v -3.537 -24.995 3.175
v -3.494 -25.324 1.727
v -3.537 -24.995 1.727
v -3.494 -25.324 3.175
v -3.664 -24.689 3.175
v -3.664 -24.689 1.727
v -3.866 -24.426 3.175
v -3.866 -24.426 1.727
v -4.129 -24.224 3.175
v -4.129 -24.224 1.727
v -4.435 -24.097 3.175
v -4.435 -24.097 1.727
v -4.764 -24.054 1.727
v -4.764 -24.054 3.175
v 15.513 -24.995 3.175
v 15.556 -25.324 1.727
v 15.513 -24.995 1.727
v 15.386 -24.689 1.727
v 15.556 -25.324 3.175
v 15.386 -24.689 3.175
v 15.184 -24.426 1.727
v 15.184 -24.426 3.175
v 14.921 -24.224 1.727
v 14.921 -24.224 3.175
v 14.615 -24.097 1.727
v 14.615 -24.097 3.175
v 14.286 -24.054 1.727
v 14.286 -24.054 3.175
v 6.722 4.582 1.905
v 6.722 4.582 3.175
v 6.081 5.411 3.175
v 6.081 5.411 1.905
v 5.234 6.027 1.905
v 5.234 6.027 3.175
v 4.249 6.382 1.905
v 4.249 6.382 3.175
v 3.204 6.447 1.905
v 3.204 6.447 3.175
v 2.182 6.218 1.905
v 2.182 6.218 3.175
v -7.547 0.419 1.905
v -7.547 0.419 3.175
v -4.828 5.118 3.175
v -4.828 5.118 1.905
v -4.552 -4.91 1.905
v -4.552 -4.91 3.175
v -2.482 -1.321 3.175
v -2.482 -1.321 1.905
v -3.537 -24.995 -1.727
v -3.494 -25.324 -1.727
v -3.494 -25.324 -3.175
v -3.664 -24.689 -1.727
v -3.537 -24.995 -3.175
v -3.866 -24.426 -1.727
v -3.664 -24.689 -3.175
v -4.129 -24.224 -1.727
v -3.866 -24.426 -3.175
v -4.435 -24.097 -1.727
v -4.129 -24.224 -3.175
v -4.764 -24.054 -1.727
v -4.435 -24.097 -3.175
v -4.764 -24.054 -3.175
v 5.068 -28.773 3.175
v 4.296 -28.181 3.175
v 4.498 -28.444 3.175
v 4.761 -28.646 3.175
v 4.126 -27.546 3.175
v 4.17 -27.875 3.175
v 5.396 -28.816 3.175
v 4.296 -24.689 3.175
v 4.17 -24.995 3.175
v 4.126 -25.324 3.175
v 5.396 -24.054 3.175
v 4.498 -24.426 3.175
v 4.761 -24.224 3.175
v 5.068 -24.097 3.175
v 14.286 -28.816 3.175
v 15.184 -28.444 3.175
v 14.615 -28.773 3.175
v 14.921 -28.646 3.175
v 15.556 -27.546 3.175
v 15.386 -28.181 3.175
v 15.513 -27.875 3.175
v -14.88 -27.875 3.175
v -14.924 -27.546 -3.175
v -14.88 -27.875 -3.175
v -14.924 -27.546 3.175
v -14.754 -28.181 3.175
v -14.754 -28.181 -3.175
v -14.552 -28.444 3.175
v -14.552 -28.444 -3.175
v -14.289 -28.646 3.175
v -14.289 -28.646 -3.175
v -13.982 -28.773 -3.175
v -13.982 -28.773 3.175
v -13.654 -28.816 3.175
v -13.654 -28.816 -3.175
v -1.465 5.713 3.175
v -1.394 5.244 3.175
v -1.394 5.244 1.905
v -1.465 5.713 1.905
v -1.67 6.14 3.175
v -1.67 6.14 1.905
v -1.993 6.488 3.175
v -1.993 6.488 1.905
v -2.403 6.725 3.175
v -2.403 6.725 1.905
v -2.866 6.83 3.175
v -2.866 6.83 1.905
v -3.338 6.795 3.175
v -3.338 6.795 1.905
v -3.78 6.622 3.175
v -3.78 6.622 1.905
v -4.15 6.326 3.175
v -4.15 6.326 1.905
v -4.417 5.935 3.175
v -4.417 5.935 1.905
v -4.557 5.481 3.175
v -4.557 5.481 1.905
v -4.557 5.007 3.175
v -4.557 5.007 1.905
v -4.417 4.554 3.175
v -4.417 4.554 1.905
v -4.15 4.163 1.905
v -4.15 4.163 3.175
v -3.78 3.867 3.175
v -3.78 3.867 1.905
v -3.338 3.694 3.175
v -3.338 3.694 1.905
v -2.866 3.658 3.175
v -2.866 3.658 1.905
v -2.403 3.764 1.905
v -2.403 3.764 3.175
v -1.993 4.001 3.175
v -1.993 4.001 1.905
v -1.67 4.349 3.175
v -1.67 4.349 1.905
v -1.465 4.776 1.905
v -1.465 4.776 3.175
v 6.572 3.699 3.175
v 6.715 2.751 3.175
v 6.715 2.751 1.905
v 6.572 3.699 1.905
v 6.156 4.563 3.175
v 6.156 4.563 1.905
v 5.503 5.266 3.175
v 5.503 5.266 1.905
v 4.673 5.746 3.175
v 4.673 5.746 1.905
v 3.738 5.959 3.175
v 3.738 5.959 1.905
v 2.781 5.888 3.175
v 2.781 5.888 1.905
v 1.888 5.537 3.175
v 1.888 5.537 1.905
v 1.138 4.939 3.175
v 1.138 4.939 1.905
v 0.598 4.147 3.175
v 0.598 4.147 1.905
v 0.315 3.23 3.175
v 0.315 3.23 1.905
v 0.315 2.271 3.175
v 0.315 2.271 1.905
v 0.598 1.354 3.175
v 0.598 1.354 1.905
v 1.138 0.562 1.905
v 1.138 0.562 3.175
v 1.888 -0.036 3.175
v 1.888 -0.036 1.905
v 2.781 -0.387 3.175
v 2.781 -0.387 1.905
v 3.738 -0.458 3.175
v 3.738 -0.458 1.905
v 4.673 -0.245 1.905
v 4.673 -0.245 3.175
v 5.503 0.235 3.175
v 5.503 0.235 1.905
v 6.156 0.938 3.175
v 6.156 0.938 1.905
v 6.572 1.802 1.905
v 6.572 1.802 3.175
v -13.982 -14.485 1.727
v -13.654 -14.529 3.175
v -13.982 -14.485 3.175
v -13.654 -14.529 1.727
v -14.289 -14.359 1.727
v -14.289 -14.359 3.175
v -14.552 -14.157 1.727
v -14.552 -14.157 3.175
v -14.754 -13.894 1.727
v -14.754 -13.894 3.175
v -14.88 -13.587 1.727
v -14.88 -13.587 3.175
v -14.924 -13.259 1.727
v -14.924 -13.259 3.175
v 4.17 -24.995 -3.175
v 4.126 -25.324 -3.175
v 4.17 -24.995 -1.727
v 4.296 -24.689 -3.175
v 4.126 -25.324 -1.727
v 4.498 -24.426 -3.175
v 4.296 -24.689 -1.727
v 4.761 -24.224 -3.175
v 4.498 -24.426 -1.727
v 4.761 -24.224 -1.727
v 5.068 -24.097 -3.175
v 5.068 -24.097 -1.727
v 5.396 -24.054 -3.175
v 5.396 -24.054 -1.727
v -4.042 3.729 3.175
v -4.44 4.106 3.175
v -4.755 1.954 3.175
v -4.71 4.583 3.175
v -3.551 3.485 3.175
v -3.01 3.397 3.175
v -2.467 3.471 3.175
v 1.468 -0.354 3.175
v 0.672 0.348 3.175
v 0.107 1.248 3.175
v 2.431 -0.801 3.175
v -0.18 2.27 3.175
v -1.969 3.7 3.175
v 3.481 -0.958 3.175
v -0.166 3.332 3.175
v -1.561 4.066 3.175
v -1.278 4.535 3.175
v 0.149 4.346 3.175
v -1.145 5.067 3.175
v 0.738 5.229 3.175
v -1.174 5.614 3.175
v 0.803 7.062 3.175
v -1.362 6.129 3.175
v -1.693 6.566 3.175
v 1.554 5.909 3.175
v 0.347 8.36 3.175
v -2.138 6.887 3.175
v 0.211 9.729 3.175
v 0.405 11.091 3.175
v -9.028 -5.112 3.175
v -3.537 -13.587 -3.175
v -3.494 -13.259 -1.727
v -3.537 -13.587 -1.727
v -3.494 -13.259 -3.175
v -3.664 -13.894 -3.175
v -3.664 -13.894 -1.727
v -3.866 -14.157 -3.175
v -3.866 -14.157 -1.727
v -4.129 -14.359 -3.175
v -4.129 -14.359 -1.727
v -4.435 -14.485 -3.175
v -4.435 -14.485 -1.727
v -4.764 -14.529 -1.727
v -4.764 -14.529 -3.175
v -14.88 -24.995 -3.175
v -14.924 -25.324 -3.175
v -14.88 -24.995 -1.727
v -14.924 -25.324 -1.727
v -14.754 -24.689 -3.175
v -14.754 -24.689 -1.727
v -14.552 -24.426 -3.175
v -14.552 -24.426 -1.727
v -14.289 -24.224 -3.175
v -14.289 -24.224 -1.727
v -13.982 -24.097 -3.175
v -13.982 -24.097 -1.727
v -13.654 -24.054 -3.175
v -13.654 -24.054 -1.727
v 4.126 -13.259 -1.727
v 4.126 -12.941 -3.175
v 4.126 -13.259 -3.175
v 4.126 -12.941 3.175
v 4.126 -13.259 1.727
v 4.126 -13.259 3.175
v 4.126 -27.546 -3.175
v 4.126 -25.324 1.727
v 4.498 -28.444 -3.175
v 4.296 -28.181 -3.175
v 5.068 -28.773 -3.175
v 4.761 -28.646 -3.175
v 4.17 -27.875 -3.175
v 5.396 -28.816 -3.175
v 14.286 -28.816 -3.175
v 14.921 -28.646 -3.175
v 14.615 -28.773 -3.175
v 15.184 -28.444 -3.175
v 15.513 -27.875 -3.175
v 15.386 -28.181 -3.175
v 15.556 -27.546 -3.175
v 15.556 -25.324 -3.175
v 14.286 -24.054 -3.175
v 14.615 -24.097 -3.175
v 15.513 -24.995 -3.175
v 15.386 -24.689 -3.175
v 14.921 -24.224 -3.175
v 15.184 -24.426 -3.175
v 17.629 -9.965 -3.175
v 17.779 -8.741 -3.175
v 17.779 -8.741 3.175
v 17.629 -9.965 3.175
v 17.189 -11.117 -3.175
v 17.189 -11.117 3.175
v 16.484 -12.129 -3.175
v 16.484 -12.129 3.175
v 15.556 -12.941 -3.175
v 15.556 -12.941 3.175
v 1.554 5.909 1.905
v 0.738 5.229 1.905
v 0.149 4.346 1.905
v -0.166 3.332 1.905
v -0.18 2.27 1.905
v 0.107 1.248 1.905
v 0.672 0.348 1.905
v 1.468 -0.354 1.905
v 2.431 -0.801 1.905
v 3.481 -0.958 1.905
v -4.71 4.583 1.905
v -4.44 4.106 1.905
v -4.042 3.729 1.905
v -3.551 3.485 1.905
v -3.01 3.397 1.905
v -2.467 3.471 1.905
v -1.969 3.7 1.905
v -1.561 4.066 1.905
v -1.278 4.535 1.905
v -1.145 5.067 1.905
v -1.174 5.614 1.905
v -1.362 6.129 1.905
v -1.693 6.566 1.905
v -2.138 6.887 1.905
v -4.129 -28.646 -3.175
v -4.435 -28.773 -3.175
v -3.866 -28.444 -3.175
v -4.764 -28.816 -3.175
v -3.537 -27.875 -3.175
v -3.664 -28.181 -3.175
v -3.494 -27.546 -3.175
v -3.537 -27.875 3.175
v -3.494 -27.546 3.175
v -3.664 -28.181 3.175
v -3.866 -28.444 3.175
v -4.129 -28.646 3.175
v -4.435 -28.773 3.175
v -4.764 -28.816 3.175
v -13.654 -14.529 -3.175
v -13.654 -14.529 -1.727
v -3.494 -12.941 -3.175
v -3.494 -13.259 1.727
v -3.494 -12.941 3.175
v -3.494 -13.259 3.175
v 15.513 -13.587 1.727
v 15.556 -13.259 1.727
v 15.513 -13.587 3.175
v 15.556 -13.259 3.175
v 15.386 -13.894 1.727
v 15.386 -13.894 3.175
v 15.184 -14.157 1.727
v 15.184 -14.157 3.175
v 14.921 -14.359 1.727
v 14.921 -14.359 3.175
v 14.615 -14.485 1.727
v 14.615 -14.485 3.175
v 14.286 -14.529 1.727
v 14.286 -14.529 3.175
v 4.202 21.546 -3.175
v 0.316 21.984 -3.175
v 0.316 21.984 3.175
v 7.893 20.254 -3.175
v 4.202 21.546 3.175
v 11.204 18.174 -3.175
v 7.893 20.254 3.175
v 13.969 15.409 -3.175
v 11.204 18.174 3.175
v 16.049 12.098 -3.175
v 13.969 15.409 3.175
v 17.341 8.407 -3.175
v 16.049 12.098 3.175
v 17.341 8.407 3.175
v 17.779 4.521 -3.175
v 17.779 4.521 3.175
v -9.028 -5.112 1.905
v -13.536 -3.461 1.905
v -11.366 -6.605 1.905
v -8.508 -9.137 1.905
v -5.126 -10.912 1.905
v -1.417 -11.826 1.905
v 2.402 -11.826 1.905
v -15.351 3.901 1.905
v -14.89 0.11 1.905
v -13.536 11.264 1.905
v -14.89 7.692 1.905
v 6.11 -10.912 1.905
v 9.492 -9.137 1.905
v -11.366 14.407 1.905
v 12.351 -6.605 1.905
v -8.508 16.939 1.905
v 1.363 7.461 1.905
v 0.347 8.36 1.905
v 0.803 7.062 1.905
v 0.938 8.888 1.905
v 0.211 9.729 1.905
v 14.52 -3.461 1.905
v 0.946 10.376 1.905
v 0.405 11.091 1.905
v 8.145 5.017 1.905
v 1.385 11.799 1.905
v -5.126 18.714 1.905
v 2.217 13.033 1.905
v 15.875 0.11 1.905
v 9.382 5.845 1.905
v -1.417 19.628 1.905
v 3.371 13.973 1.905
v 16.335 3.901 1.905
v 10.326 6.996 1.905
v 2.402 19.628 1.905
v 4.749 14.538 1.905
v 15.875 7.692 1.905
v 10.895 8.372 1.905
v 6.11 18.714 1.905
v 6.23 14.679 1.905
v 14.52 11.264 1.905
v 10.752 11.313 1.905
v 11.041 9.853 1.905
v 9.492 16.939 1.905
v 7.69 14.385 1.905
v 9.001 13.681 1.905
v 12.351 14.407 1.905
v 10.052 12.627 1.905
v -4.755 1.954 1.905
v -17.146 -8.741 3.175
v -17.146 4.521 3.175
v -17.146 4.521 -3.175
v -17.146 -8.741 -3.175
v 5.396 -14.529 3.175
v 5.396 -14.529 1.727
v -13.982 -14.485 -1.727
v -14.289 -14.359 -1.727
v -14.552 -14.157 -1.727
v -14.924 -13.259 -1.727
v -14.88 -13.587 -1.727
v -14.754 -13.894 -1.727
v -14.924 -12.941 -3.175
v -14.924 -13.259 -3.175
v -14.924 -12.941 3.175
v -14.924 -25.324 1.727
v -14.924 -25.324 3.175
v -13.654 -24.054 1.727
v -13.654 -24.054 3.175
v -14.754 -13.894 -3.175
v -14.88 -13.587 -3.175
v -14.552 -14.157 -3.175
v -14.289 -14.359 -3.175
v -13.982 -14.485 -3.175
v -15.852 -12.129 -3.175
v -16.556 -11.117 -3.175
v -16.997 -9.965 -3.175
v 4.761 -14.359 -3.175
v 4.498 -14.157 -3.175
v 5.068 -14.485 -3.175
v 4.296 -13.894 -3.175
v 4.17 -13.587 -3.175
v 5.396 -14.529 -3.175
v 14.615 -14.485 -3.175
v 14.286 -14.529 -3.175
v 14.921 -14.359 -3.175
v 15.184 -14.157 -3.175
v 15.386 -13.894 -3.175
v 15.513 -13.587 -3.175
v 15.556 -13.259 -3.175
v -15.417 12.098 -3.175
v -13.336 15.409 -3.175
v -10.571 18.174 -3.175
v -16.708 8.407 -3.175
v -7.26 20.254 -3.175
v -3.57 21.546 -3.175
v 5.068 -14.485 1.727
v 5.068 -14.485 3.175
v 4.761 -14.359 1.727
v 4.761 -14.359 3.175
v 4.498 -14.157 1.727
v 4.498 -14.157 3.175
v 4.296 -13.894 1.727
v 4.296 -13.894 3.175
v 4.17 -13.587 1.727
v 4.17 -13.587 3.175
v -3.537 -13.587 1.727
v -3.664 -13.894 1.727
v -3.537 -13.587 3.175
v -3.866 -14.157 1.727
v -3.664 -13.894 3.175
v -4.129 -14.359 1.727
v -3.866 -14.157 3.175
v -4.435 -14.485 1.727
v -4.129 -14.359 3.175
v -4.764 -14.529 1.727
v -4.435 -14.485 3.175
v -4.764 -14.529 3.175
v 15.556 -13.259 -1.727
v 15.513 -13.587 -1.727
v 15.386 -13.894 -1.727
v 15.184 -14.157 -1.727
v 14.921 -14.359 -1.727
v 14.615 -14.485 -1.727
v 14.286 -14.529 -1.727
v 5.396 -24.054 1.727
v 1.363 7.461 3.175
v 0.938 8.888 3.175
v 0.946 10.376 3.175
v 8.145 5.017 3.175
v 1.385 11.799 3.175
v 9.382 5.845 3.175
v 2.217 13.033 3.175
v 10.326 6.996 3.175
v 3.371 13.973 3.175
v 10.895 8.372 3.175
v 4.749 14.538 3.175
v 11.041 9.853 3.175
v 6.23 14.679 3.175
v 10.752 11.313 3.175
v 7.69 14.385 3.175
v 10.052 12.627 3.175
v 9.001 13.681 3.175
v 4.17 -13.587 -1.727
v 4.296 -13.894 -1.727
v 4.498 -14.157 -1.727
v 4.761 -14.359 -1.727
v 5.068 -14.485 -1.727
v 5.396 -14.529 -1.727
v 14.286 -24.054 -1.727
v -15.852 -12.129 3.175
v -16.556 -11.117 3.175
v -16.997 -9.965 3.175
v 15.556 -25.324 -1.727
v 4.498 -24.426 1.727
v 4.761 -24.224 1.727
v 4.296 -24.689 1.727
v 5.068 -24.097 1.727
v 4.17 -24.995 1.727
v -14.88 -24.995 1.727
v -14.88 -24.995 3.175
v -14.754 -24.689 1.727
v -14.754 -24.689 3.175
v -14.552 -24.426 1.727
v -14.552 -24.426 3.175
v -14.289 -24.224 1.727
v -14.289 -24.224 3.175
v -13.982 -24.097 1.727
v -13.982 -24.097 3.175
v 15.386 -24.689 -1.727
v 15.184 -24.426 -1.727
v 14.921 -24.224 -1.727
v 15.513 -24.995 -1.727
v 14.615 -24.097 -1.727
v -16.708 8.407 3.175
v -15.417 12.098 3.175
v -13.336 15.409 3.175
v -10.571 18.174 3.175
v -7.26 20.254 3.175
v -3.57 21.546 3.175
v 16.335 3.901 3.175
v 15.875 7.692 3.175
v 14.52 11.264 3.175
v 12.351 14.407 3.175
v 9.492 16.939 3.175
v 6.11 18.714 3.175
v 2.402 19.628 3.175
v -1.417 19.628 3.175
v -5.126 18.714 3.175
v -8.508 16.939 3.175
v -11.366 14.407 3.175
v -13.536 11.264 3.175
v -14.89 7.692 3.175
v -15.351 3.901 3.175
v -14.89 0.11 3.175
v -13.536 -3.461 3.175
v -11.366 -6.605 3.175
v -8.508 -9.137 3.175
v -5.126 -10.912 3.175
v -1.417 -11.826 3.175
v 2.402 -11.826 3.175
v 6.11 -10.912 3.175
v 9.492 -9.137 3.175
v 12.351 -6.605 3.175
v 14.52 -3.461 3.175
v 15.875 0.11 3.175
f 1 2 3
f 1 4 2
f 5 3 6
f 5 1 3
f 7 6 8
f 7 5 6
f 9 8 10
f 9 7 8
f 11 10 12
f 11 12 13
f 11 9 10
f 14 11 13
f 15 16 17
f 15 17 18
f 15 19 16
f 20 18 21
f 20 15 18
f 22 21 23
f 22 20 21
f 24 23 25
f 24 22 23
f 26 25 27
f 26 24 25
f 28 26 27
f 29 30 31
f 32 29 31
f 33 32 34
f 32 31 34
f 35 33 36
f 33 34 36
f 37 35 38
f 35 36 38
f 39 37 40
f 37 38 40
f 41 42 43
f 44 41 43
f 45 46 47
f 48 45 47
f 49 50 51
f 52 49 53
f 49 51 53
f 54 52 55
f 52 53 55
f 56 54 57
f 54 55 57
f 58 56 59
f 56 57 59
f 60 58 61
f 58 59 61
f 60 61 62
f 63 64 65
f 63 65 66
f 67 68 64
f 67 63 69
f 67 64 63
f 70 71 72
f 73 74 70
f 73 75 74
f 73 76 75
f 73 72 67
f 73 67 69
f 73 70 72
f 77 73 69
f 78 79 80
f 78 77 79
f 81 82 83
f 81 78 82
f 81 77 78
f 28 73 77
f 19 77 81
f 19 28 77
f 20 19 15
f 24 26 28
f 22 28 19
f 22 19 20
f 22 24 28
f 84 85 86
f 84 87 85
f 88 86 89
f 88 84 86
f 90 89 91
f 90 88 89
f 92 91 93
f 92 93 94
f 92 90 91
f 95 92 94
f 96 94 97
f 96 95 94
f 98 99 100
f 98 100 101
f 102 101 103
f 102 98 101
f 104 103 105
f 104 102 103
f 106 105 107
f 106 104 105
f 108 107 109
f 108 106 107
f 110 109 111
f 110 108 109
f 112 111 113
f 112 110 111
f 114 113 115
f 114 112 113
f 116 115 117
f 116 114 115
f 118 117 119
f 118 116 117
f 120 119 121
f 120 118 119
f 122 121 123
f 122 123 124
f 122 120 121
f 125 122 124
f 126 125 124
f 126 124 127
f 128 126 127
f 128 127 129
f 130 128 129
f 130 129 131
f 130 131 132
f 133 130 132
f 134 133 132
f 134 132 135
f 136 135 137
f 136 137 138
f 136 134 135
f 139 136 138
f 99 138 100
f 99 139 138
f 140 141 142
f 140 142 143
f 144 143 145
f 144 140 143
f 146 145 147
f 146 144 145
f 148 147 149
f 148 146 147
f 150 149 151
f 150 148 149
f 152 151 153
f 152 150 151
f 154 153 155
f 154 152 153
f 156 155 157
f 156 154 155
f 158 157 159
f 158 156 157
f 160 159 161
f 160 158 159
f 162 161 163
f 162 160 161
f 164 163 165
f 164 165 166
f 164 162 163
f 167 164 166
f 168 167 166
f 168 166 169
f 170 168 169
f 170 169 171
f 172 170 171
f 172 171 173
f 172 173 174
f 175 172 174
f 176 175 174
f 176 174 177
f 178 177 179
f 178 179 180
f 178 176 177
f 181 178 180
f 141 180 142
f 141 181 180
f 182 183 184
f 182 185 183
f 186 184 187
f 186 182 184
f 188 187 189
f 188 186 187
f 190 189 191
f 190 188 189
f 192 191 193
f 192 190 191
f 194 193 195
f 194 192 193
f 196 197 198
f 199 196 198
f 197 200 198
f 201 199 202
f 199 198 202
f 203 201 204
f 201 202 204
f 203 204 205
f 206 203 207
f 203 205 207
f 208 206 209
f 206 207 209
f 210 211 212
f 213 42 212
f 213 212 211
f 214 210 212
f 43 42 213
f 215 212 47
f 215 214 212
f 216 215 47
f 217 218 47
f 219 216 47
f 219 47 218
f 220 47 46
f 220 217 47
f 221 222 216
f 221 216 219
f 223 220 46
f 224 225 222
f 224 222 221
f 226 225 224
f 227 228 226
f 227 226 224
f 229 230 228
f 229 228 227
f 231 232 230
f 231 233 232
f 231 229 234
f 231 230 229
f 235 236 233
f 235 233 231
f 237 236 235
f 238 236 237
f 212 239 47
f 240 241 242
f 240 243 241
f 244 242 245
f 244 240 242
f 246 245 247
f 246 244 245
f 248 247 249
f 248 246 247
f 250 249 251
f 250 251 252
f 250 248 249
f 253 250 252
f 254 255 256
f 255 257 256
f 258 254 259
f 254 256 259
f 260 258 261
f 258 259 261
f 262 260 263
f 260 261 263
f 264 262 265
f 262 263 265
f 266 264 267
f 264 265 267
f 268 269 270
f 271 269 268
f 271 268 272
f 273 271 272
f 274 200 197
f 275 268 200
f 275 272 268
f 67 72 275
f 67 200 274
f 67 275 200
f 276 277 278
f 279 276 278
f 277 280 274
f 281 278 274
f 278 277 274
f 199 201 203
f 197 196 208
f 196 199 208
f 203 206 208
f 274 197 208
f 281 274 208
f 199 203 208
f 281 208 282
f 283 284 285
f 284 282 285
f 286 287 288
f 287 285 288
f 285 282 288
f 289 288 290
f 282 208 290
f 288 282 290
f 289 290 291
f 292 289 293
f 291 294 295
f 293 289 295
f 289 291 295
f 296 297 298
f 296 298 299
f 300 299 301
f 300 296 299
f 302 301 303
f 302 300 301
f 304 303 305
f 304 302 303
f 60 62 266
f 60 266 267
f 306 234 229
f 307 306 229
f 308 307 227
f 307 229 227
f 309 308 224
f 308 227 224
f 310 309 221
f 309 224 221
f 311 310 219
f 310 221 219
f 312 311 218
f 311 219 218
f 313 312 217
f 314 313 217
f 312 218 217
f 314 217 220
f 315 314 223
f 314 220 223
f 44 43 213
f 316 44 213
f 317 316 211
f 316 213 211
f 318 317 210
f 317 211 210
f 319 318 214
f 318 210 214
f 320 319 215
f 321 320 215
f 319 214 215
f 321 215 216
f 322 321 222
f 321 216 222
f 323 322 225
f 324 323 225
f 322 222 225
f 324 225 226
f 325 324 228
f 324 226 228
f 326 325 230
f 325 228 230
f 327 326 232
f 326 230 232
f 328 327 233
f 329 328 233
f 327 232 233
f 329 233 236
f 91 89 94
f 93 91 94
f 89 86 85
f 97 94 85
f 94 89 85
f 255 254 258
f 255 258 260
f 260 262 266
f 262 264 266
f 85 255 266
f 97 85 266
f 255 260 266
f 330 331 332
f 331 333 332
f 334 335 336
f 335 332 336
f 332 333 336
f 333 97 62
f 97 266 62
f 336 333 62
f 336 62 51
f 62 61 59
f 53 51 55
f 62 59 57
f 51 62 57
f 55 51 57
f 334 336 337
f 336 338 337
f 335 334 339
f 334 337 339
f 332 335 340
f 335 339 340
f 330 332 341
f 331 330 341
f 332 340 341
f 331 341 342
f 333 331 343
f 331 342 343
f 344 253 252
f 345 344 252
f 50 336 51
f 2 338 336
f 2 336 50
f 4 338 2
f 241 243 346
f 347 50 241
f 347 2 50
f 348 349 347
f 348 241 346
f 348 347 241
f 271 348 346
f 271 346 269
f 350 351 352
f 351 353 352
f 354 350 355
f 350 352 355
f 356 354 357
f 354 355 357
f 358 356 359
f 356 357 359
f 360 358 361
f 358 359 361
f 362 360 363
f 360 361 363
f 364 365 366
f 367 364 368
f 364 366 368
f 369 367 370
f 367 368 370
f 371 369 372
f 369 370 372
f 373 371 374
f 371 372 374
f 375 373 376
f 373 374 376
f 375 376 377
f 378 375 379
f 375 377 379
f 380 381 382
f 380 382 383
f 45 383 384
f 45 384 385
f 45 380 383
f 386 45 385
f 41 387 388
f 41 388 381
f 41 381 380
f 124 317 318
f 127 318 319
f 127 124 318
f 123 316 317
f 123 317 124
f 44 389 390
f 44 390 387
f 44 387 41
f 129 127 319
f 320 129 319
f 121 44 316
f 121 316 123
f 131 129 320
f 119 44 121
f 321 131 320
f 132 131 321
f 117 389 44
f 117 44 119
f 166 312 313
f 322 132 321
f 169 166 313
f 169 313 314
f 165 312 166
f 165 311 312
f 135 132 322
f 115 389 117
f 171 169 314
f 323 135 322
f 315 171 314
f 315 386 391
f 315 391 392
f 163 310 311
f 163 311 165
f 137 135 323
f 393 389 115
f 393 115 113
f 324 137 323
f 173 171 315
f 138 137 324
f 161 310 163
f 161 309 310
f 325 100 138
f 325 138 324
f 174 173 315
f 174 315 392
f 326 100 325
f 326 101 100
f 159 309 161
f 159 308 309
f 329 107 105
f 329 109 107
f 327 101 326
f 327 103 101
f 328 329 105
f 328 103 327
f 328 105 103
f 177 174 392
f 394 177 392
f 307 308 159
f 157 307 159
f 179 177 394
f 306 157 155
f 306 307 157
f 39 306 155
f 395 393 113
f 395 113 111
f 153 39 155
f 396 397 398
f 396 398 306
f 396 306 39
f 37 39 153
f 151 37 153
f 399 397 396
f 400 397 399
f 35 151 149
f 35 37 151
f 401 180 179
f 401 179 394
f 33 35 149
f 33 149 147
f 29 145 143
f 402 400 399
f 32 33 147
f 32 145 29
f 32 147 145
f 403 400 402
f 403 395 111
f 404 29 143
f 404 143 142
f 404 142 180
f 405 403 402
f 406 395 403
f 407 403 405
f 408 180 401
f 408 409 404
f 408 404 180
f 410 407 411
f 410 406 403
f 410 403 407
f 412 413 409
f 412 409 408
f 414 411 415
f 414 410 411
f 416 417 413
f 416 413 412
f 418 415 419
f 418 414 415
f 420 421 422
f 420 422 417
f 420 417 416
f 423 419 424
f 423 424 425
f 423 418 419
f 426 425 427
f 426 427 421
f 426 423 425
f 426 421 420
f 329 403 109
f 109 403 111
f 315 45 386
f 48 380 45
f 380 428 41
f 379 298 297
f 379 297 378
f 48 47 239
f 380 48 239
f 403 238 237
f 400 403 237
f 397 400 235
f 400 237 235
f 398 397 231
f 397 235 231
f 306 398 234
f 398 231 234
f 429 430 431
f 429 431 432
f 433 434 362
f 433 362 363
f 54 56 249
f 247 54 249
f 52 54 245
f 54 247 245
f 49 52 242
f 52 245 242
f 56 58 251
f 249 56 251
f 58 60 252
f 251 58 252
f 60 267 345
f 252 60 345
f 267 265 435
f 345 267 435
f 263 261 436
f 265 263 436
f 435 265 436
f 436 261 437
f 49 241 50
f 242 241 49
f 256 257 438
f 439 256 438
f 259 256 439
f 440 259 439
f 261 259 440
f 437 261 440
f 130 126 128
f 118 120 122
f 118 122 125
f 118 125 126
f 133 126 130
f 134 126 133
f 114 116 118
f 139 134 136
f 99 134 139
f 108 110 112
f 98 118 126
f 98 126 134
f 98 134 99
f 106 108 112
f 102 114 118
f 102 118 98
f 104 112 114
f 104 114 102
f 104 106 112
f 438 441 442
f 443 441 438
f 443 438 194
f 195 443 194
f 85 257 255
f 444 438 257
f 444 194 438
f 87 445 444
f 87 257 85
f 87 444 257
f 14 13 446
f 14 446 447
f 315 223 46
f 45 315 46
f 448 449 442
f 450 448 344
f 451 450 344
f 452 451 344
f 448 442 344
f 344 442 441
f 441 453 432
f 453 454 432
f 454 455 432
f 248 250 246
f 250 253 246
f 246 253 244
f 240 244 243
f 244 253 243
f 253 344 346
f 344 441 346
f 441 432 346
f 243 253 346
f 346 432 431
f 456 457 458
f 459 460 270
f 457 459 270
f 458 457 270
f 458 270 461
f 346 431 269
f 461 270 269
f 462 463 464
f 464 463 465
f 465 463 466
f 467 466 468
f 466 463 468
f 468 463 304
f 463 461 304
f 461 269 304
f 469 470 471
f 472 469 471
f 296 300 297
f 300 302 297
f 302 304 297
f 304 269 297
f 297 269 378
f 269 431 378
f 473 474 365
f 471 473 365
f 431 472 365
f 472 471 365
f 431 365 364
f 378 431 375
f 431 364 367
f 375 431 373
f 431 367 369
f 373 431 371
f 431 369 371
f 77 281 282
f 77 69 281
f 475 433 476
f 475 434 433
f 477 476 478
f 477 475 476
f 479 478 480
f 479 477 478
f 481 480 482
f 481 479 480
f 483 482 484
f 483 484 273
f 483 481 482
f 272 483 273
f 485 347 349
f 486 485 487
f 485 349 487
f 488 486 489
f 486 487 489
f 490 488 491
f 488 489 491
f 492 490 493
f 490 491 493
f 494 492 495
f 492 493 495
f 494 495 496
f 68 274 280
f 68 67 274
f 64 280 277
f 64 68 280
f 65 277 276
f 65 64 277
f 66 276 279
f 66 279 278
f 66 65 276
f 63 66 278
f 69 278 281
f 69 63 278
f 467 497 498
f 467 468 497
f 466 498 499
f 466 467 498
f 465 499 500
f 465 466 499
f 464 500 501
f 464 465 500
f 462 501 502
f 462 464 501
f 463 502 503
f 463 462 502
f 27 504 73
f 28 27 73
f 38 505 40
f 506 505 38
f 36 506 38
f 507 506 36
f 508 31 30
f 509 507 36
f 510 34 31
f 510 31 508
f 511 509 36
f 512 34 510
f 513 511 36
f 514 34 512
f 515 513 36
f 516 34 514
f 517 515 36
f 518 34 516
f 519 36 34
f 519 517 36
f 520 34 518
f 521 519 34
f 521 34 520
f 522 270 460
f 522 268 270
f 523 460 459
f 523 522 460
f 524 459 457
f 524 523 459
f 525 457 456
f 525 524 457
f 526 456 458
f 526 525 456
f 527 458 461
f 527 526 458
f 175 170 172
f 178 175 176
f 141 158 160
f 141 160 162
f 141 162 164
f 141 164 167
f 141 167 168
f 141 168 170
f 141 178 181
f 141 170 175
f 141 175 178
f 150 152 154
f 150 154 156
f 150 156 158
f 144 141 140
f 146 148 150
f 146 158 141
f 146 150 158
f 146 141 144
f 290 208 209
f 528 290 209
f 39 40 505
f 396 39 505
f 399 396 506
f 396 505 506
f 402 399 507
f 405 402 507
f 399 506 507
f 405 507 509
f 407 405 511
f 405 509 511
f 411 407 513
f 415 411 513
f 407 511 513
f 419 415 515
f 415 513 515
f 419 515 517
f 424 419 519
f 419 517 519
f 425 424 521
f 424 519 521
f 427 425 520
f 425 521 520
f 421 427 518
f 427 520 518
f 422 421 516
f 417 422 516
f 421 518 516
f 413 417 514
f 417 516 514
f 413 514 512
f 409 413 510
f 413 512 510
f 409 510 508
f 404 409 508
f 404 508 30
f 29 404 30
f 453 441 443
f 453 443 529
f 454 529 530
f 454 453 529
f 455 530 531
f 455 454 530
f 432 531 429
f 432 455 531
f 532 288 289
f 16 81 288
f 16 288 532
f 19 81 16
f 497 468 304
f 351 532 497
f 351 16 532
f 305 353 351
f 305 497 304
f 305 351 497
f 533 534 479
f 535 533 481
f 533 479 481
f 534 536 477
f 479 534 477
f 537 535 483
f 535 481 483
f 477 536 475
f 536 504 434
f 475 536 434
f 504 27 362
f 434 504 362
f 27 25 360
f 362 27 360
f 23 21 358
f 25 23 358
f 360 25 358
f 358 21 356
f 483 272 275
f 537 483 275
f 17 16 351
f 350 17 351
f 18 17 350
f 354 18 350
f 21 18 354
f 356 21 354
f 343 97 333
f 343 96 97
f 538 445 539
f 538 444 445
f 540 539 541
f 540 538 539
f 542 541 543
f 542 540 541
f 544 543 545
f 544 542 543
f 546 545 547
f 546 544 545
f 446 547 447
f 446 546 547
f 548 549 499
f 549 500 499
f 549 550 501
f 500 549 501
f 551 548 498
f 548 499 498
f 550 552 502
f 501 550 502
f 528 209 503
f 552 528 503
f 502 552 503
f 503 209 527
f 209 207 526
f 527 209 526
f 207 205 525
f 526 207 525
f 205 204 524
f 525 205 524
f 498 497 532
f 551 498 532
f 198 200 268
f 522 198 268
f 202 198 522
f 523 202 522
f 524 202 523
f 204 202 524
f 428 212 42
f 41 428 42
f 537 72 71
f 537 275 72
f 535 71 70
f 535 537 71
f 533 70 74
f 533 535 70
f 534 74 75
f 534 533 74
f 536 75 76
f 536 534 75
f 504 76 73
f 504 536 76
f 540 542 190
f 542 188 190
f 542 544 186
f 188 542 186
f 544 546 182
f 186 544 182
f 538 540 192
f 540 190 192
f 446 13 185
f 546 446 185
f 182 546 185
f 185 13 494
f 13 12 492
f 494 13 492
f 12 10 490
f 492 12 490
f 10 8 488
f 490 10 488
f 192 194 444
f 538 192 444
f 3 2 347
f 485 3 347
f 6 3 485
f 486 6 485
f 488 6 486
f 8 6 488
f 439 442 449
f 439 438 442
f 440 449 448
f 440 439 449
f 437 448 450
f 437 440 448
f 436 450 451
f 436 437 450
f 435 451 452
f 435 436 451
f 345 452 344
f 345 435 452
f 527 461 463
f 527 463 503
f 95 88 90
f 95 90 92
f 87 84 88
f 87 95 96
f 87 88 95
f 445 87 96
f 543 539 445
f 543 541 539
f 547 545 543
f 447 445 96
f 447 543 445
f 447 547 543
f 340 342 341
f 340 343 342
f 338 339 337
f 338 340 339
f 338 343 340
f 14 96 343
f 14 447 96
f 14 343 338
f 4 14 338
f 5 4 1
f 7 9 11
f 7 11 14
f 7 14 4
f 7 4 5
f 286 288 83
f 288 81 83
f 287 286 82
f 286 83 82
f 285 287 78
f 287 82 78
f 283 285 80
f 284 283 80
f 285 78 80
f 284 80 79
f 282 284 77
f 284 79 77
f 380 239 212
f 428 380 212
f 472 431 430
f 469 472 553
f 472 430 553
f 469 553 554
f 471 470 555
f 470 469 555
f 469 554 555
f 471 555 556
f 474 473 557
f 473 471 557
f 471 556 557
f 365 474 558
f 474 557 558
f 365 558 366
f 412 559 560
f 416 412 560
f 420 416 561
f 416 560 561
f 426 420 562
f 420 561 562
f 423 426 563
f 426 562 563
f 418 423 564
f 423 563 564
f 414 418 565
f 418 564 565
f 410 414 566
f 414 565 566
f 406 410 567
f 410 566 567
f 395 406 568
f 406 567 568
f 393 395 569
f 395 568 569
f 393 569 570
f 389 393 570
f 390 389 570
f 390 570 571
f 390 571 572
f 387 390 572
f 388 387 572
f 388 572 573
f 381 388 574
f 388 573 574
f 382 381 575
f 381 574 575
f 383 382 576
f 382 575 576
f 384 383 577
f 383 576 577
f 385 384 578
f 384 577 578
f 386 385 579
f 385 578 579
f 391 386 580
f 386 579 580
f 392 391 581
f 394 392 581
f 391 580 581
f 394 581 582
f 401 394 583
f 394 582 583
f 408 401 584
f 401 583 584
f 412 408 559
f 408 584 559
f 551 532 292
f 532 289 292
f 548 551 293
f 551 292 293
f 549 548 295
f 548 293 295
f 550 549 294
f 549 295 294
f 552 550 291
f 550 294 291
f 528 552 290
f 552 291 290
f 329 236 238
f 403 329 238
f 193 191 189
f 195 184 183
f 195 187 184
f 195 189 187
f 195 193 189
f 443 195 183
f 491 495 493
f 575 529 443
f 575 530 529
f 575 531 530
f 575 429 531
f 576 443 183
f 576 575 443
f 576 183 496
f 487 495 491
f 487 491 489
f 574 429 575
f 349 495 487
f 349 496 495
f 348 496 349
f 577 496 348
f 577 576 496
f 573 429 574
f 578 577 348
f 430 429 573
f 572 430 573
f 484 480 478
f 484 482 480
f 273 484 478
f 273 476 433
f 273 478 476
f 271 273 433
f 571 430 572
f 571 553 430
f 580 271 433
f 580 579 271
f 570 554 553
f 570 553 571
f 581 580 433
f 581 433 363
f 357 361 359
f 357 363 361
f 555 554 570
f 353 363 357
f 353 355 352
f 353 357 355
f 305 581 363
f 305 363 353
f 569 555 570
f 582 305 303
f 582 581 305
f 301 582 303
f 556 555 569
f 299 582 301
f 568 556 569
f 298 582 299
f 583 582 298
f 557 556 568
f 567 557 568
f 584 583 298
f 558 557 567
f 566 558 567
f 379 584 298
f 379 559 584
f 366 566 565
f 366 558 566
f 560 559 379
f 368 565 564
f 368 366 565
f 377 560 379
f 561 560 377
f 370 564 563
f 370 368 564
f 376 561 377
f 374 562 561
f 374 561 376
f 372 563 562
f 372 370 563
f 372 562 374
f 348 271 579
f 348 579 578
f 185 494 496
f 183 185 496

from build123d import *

# Parameters (mm, degrees)
F1_DEPTH    = 3.175
F2_W        = 9.525
F2_H        = 1.4478
F3_DEPTH    = 25.4
F4_R        = 15.842845787
F4_R_2      = 3.2177044056
F4_R_3      = 1.5904309239
F5_DEPTH    = 1.27
F6_T1_DEPTH = 31.75
F6_T3_DEPTH = 27.3506510316
F7_R        = 1.27
F9_DEPTH    = 25.4


# Not quite as in the source:
# - a fillet or chamfer that OpenCascade refuses, or shapes differently, is made with other operations: its cross-section is extruded or revolved along the edge and cut away or added


with BuildPart() as f1:
    # F0 (on Top) → F1 (new body, symmetric)
    with BuildSketch(Plane.XY):
        Polygon((17.7787664203, 21.9838270611), (-17.1462335797, 21.9838270611), (-17.1462335797, -12.9411729389), (-14.9237335797, -12.9411729389), (-14.9237335797, -28.8161729389), (-3.4937335797, -28.8161729389), (-3.4937335797, -12.9411729389), (4.1262664203, -12.9411729389), (4.1262664203, -28.8161729389), (15.5562664203, -28.8161729389), (15.5562664203, -12.9411729389), (17.7787664203, -12.9411729389), align=None)
    extrude(amount=F1_DEPTH, both=True)

    # F2 (on Right) → F3 (cut, symmetric)
    with BuildSketch(Plane.YZ):
        with Locations((-19.2911729389, -2.4511)):
            Rectangle(F2_W, F2_H)
        with Locations((-19.2911729389, 2.4511)):
            Rectangle(F2_W, F2_H)
    extrude(amount=F3_DEPTH, both=True, mode=Mode.SUBTRACT)

    # F4 (on face) → F5 (cut)
    with BuildSketch(Plane.XY.offset(3.175)):
        with Locations((0.4921501707, 3.9010436143)):
            Circle(F4_R)
        with BuildLine():
            Line((-2.1375703251, 6.8868143019), (0.4050256131, 11.0911789057))
            ThreePointArc((0.4050256131, 11.0911789057), (0.3466666466, 8.3599053372), (1.5539010716, 5.9092225511))
            ThreePointArc((1.5539010716, 5.9092225511), (-0.0735190255, 1.7484484648), (3.4811131017, -0.9580488308))
            Line((3.4811131017, -0.9580488308), (-4.5523895124, -4.9100595401))
            Line((-4.5523895124, -4.9100595401), (-2.4823771265, -1.3211422242))
            Line((-2.4823771265, -1.3211422242), (-9.0284545614, -5.1116843583))
            Line((-9.0284545614, -5.1116843583), (-4.7554110557, 1.9540993141))
            Line((-4.7554110557, 1.9540993141), (-7.5469899631, 0.4189560082))
            Line((-7.5469899631, 0.4189560082), (-4.8280507742, 5.1179121089))
            ThreePointArc((-4.8280507742, 5.1179121089), (-1.9693373897, 3.7003874584), (-2.1375703251, 6.8868143019))
        make_face(mode=Mode.SUBTRACT)
        with Locations((3.4971262654, 2.7505044746)):
            Circle(F4_R_2, mode=Mode.SUBTRACT)
        with Locations((-2.9845039712, 5.2444444735)):
            Circle(F4_R_3, mode=Mode.SUBTRACT)
        with BuildLine():
            ThreePointArc((2.1821519983, 6.218135758), (7.6895432258, 14.3852639145), (6.7216994367, 4.5823756229))
            ThreePointArc((6.7216994367, 4.5823756229), (4.7543334077, 6.2394949077), (2.1821519983, 6.218135758))
        make_face(mode=Mode.SUBTRACT)
    extrude(amount=-F5_DEPTH, mode=Mode.SUBTRACT)

    # F6: fillet of radius 5.08 on 4 edges, made by hand

    # F6_s2 → F6_t1 (cut)
    with BuildSketch(Plane.XY.offset(-15.875)):
        with BuildLine():
            ThreePointArc((17.7787664203, 16.9038270611), (16.2908688687, 20.4959295096), (12.6987664203, 21.9838270611))
            Line((12.6987664203, 21.9838270611), (17.7787664203, 21.9838270611))
            Line((17.7787664203, 21.9838270611), (17.7787664203, 16.9038270611))
        make_face()
        with BuildLine():
            ThreePointArc((-12.0662335797, 21.9838270611), (-15.6583360282, 20.4959295096), (-17.1462335797, 16.9038270611))
            Line((-17.1462335797, 16.9038270611), (-17.1462335797, 21.9838270611))
            Line((-17.1462335797, 21.9838270611), (-12.0662335797, 21.9838270611))
        make_face()
    extrude(amount=F6_T1_DEPTH, mode=Mode.SUBTRACT)

    # F6_s4 → F6_t3 (cut)
    with BuildSketch(Plane.XY.offset(-13.6753255158)):
        with BuildLine():
            ThreePointArc((-14.9237335797, -12.9411729388), (-16.5563616403, -11.1169951731), (-17.1462335797, -8.7410427325))
            Line((-17.1462335797, -8.7410427325), (-17.1462335797, -12.9411729389))
            Line((-17.1462335797, -12.9411729389), (-14.9237335797, -12.9411729388))
        make_face()
        with BuildLine():
            ThreePointArc((17.7787664203, -8.7410427325), (17.1888944808, -11.1169951731), (15.5562664203, -12.9411729388))
            Line((15.5562664203, -12.9411729388), (17.7787664203, -12.9411729389))
            Line((17.7787664203, -12.9411729389), (17.7787664203, -8.7410427325))
        make_face()
    extrude(amount=F6_T3_DEPTH, mode=Mode.SUBTRACT)

    # F7
    f7_edges = [f1.edges().sort_by_distance(p)[0] for p in [
        (-14.923734, -14.528673, 2.4511),
        (-3.493734, -14.528673, 2.4511),
        (15.556266, -14.528673, 2.4511),
        (4.126266, -14.528673, 2.4511),
        (15.556266, -14.528673, -2.4511),
        (4.126266, -14.528673, -2.4511),
        (-14.923734, -14.528673, -2.4511),
        (-3.493734, -14.528673, -2.4511),
        (-3.493734, -24.053673, -2.4511),
        (-3.493734, -24.053673, 2.4511),
        (15.556266, -24.053673, -2.4511),
        (15.556266, -24.053673, 2.4511),
        (15.556266, -28.816173, 0),
        (4.126266, -28.816173, 0),
        (-3.493734, -28.816173, 0),
        (-14.923734, -28.816173, 0),
        (-14.923734, -24.053673, 2.4511),
        (-14.923734, -24.053673, -2.4511),
        (4.126266, -24.053673, 2.4511),
        (4.126266, -24.053673, -2.4511),
    ]]
    fillet(f7_edges, radius=F7_R)

    # F8 (on face) → F9 (cut)
    with BuildSketch(Plane.XY.offset(3.175)):
        with BuildLine():
            ThreePointArc((-17.1462335797, 16.9038270611), (-15.6583360282, 20.4959295096), (-12.0662335797, 21.9838270611))
            Line((-12.0662335797, 21.9838270611), (-17.1462335797, 21.9838270611))
            Line((-17.1462335797, 21.9838270611), (-17.1462335797, 16.9038270611))
        make_face()
        with BuildLine():
            ThreePointArc((12.6987664203, 21.9838270611), (16.2908688687, 20.4959295095), (17.7787664203, 16.9038270611))
            Line((17.7787664203, 16.9038270611), (17.7787664203, 21.9838270611))
            Line((17.7787664203, 21.9838270611), (12.6987664203, 21.9838270611))
        make_face()
        with BuildLine():
            ThreePointArc((0.3162664203, 21.9838270611), (12.6641185867, 16.8691792276), (17.7787664203, 4.5213270611))
            Line((17.7787664203, 4.5213270611), (17.7787664203, 16.9038270611))
            ThreePointArc((17.7787664203, 16.9038270611), (16.2908688687, 20.4959295095), (12.6987664203, 21.9838270611))
            Line((12.6987664203, 21.9838270611), (0.3162664203, 21.9838270611))
        make_face()
        with BuildLine():
            ThreePointArc((-17.1462335797, 4.5213270326), (-12.0315857563, 16.8691792175), (0.3162664203, 21.9838270611))
            Line((0.3162664203, 21.9838270611), (-12.0662335797, 21.9838270611))
            ThreePointArc((-12.0662335797, 21.9838270611), (-15.6583360282, 20.4959295096), (-17.1462335797, 16.9038270611))
            Line((-17.1462335797, 16.9038270611), (-17.1462335797, 4.5213270326))
        make_face()
    extrude(amount=-F9_DEPTH, mode=Mode.SUBTRACT)


solid = f1.part
